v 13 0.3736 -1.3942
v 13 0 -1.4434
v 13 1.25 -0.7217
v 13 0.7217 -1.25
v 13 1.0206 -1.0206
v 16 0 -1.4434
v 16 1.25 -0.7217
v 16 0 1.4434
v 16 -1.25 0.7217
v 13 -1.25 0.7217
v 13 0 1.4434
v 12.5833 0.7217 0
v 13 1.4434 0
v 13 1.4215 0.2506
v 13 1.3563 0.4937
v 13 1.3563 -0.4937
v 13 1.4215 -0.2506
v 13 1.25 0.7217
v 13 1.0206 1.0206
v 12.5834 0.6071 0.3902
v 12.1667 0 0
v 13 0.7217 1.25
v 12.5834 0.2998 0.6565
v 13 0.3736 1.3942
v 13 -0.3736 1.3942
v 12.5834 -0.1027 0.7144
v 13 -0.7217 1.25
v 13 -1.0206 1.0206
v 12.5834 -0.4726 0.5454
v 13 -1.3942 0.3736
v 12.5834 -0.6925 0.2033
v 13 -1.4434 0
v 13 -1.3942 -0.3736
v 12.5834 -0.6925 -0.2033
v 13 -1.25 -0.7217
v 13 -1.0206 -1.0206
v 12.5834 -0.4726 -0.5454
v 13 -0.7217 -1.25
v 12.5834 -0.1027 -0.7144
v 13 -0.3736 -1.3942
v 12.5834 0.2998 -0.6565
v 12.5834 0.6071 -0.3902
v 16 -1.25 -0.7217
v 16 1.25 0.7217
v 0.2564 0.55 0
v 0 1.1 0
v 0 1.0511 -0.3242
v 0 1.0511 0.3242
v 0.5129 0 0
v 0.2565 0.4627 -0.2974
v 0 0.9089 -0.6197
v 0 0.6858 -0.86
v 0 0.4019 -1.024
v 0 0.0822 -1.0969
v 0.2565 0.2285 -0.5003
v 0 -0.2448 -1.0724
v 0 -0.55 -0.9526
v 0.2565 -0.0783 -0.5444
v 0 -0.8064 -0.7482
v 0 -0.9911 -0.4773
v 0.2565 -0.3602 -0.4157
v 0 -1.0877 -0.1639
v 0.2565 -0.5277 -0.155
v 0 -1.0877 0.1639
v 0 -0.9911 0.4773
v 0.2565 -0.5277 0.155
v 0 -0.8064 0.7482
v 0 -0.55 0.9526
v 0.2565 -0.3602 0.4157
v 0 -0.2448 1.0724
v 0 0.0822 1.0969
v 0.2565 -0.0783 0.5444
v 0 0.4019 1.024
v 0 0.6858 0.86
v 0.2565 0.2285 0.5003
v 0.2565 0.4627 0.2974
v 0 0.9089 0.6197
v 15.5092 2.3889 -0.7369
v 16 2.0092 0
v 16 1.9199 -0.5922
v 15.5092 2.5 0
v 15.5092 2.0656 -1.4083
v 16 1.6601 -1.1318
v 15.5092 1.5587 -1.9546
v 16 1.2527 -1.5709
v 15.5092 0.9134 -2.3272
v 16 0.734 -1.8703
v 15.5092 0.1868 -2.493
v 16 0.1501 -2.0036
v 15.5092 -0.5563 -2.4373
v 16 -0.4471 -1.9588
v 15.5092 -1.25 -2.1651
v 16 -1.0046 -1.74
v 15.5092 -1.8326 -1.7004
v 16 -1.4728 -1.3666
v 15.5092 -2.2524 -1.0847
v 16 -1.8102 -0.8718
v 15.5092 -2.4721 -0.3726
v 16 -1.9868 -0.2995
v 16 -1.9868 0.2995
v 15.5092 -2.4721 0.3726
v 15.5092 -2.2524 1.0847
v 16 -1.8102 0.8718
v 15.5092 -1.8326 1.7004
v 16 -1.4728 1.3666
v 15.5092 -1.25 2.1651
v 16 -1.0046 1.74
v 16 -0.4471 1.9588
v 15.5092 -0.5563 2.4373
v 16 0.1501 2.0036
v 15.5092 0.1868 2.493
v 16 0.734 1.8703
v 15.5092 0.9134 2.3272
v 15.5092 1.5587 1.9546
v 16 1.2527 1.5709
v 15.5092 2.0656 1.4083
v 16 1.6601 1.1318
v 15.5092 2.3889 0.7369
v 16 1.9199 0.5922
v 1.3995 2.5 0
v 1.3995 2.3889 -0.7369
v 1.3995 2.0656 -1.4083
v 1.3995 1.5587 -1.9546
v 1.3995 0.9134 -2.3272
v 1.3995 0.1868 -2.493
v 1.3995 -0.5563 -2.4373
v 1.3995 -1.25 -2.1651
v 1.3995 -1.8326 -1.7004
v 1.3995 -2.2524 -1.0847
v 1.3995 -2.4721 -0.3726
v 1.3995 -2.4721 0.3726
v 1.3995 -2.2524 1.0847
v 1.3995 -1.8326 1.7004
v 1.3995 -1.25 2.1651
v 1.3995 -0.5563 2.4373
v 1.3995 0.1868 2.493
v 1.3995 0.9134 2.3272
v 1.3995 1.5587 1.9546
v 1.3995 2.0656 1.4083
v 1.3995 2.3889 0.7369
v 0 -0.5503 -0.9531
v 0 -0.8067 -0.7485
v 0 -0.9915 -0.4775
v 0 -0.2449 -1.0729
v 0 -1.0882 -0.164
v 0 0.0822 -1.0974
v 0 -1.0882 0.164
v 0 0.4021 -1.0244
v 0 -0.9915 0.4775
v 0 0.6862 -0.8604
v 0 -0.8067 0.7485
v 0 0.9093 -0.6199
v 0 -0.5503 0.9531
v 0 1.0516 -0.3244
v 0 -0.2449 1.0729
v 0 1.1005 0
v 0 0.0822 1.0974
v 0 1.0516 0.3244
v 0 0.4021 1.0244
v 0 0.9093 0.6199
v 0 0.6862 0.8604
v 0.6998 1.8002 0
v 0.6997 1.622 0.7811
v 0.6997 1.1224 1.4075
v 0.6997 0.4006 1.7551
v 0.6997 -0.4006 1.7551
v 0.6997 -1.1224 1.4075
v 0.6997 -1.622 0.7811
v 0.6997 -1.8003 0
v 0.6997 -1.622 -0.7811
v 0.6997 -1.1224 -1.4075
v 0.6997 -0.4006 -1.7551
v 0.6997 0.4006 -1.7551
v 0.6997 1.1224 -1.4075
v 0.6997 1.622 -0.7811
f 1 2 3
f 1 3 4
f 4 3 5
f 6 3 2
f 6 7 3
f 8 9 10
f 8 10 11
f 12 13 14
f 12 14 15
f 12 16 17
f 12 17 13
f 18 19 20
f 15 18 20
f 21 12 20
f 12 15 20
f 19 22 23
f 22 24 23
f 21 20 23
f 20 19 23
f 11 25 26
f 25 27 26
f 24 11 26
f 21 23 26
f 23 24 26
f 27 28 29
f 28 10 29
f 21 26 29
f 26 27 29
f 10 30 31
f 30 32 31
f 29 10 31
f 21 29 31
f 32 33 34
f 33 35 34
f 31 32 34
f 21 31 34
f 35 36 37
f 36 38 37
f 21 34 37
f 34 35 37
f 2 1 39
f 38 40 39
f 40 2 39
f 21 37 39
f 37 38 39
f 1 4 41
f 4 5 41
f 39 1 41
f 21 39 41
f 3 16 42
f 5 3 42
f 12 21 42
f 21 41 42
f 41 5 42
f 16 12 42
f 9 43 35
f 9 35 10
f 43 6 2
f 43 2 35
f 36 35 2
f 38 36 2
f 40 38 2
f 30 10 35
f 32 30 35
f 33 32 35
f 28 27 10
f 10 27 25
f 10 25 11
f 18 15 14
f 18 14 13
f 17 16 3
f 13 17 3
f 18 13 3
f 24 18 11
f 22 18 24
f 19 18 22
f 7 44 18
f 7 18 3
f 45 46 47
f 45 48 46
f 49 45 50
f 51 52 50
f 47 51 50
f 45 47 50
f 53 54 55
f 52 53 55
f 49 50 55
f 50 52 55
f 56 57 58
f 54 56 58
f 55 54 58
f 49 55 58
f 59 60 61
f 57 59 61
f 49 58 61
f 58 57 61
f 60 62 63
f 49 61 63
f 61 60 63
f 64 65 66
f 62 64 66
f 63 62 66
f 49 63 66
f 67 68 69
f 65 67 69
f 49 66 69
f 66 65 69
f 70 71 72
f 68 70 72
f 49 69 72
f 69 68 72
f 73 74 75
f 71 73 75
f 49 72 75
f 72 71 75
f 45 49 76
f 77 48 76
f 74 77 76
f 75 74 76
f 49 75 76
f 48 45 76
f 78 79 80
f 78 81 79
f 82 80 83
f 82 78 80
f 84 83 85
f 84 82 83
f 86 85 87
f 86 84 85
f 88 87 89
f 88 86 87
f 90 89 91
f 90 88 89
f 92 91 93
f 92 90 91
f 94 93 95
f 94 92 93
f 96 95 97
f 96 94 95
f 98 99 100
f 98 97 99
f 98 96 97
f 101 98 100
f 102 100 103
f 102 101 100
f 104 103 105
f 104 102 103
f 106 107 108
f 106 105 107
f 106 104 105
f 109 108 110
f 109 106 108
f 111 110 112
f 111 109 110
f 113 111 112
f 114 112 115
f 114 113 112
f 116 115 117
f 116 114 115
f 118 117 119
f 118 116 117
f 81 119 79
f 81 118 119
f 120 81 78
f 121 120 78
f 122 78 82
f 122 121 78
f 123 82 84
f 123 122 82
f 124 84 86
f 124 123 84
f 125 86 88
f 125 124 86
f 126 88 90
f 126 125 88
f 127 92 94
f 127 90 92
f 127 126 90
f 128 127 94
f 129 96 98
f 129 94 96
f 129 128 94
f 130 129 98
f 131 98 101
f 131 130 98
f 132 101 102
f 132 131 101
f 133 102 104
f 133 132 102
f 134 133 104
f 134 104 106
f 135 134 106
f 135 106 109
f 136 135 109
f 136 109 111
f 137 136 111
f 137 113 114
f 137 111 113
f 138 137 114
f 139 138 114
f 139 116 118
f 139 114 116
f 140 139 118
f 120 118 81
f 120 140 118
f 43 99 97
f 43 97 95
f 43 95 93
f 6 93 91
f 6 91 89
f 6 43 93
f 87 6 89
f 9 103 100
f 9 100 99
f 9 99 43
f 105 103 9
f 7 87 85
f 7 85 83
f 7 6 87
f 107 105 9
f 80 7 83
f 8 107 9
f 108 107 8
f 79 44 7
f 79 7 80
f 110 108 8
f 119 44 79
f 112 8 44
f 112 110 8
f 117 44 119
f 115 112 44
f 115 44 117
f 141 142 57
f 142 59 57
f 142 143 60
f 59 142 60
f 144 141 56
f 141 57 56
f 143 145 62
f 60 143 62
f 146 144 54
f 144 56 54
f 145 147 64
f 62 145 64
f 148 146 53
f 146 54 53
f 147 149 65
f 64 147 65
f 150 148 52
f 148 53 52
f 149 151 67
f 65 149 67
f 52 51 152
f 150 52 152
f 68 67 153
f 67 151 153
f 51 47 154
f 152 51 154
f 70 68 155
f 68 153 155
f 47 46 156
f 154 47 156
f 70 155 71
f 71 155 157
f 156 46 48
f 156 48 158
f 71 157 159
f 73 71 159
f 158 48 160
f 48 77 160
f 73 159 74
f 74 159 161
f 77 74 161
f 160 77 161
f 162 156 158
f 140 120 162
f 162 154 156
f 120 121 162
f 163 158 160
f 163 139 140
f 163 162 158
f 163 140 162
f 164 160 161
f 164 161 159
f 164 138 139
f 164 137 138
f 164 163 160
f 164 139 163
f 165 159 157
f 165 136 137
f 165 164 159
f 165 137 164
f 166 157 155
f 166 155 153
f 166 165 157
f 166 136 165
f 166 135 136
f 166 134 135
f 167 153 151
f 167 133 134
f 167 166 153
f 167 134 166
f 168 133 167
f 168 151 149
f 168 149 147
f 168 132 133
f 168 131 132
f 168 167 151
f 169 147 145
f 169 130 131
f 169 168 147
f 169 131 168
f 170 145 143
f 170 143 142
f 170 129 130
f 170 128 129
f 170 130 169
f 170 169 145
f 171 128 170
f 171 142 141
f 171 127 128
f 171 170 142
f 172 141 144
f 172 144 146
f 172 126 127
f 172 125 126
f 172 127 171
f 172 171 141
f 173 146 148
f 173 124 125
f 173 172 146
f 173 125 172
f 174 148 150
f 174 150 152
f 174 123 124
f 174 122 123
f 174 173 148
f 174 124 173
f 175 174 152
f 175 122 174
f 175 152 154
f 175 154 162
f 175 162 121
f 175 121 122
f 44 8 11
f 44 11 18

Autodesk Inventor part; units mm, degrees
ref_plane "YZ Plane" through (0, 0, 0) normal (1, 0, 0) x (0, 1, 0)
ref_plane "XZ Plane" through (0, 0, 0) normal (0, 1, 0) x (-1, 0, 0)
sketch "Sketch1" plane through (0, 0, 0) normal (0, 0, 1) x (1, 0, 0)
  line L0 (0.5129, 0) -> (12.1667, 0)
  line L1 (16, 1.4434) -> (16, 2.5)
  line L2 (16, 2.5) -> (0, 2.5)
  line L3 (16, 1.4434) -> (13, 1.4434)
  line L4 (13, 1.4434) -> (12.1667, 0)
  line L5 (0, 1.1) -> (0.5129, 0)
  line L6 (0, -0.5) -> (0, 3) projected
  line L7 (0, 1.1) -> (0, 2.5)
  point P0 (0, 0)
  dimension "d0" = 3
  dimension "d1" = 60
  dimension "d2" = 5
  dimension "d3" = 2.8868
  dimension "d4" = 16
  dimension "d5" = 65
  dimension "d7" = 2.2
revolve "Body" add sketch "Sketch1" angle 360 about axis through (0.5129, 0, 0) along (1, 0, 0)
sketch "Sketch2" plane through (16, 0, 0) normal (1, 0, 0) x (0, 0, -1)
  circle A0 centre (0, 0) radius 1.4434 projected
  circle A1 centre (0, 0) radius 2.5 projected
  line L0 (1.4434, 0) -> (0.7217, -1.25)
  line L1 (0.7217, -1.25) -> (-0.7217, -1.25)
  line L2 (-0.7217, -1.25) -> (-1.4434, 0)
  line L3 (-1.4434, 0) -> (-0.7217, 1.25)
  line L4 (-0.7217, 1.25) -> (0.7217, 1.25)
  line L5 (0.7217, 1.25) -> (1.4434, 0)
extrude "Slot" add sketch "Sketch2" against normal blind 3 contours L5 A0 | A0 L0 | L4 A0 | A0 L1 | L3 A0 | A0 L2
chamfer "Chamfer1" distance 1.4 angle 45 1 edges at (0, -2.5, 0) measured on face at (0, 2.0091, -0.1994)
thread "Thread" size "M5x0.8" class "6g" standard "ISO Metric profile" length 16
chamfer "Chamfer2" distance 0.4908 angle 45 1 edges at (16, -2.5, 0) measured on face at (11.1332, 2.4919, -0.2012)
ref_plane "Work Plane1" through (8, 0, 0) normal (0, -0.5, -0.866) x (1, 0, 0)
equation "\"d0\" = INTI"
equation "\"d2\" = NND"
equation "\"d3\" = 1.1547 * SW"
equation "\"d4\" = NLG"
equation "\"d5\" = 0.5 * ANG"
equation "\"d7\" = SPD"
equation "\"d8\" = INTI"
equation "\"d10\" = -0.5 * SPD + 0.5 * NND"
equation "\"d11\" = FAWI"
equation "\"d33\" = -0.5 * SPD + 0.5 * NND"
equation "\"d14\" = NLG"
equation "\"d12\" = -0.5 * GD1 + 0.5 * NND"
equation "\"d13\" = FAWI"
equation "\"d34\" = -0.5 * GD1 + 0.5 * NND"
equation "\"NND\" = 5"
equation "\"NLG\" = 16"
equation "\"INTI\" = 3"
equation "\"FAWI\" = 45deg"
equation "\"SW\" = 2.5"
equation "\"GD1\" = THREADDIA - 1.2269 * PTC"
equation "\"ANG\" = 130deg"
equation "\"FAWI1\" = 60deg"
equation "\"SPD\" = 2.2"
equation "\"GUL\" = 0.61345 * PTC"
equation "\"TOA\" = 30deg"
equation "\"THREADDIA\" = 5"
equation "\"PTC\" = 0.8"
equation "\"GAL\" = 0.61345 * PTC"
equation "\"E0\" = 1.155 * SW"
properties part number "AS 1421 - M5 x 16 Cup Point" material "Steel, Mild"
